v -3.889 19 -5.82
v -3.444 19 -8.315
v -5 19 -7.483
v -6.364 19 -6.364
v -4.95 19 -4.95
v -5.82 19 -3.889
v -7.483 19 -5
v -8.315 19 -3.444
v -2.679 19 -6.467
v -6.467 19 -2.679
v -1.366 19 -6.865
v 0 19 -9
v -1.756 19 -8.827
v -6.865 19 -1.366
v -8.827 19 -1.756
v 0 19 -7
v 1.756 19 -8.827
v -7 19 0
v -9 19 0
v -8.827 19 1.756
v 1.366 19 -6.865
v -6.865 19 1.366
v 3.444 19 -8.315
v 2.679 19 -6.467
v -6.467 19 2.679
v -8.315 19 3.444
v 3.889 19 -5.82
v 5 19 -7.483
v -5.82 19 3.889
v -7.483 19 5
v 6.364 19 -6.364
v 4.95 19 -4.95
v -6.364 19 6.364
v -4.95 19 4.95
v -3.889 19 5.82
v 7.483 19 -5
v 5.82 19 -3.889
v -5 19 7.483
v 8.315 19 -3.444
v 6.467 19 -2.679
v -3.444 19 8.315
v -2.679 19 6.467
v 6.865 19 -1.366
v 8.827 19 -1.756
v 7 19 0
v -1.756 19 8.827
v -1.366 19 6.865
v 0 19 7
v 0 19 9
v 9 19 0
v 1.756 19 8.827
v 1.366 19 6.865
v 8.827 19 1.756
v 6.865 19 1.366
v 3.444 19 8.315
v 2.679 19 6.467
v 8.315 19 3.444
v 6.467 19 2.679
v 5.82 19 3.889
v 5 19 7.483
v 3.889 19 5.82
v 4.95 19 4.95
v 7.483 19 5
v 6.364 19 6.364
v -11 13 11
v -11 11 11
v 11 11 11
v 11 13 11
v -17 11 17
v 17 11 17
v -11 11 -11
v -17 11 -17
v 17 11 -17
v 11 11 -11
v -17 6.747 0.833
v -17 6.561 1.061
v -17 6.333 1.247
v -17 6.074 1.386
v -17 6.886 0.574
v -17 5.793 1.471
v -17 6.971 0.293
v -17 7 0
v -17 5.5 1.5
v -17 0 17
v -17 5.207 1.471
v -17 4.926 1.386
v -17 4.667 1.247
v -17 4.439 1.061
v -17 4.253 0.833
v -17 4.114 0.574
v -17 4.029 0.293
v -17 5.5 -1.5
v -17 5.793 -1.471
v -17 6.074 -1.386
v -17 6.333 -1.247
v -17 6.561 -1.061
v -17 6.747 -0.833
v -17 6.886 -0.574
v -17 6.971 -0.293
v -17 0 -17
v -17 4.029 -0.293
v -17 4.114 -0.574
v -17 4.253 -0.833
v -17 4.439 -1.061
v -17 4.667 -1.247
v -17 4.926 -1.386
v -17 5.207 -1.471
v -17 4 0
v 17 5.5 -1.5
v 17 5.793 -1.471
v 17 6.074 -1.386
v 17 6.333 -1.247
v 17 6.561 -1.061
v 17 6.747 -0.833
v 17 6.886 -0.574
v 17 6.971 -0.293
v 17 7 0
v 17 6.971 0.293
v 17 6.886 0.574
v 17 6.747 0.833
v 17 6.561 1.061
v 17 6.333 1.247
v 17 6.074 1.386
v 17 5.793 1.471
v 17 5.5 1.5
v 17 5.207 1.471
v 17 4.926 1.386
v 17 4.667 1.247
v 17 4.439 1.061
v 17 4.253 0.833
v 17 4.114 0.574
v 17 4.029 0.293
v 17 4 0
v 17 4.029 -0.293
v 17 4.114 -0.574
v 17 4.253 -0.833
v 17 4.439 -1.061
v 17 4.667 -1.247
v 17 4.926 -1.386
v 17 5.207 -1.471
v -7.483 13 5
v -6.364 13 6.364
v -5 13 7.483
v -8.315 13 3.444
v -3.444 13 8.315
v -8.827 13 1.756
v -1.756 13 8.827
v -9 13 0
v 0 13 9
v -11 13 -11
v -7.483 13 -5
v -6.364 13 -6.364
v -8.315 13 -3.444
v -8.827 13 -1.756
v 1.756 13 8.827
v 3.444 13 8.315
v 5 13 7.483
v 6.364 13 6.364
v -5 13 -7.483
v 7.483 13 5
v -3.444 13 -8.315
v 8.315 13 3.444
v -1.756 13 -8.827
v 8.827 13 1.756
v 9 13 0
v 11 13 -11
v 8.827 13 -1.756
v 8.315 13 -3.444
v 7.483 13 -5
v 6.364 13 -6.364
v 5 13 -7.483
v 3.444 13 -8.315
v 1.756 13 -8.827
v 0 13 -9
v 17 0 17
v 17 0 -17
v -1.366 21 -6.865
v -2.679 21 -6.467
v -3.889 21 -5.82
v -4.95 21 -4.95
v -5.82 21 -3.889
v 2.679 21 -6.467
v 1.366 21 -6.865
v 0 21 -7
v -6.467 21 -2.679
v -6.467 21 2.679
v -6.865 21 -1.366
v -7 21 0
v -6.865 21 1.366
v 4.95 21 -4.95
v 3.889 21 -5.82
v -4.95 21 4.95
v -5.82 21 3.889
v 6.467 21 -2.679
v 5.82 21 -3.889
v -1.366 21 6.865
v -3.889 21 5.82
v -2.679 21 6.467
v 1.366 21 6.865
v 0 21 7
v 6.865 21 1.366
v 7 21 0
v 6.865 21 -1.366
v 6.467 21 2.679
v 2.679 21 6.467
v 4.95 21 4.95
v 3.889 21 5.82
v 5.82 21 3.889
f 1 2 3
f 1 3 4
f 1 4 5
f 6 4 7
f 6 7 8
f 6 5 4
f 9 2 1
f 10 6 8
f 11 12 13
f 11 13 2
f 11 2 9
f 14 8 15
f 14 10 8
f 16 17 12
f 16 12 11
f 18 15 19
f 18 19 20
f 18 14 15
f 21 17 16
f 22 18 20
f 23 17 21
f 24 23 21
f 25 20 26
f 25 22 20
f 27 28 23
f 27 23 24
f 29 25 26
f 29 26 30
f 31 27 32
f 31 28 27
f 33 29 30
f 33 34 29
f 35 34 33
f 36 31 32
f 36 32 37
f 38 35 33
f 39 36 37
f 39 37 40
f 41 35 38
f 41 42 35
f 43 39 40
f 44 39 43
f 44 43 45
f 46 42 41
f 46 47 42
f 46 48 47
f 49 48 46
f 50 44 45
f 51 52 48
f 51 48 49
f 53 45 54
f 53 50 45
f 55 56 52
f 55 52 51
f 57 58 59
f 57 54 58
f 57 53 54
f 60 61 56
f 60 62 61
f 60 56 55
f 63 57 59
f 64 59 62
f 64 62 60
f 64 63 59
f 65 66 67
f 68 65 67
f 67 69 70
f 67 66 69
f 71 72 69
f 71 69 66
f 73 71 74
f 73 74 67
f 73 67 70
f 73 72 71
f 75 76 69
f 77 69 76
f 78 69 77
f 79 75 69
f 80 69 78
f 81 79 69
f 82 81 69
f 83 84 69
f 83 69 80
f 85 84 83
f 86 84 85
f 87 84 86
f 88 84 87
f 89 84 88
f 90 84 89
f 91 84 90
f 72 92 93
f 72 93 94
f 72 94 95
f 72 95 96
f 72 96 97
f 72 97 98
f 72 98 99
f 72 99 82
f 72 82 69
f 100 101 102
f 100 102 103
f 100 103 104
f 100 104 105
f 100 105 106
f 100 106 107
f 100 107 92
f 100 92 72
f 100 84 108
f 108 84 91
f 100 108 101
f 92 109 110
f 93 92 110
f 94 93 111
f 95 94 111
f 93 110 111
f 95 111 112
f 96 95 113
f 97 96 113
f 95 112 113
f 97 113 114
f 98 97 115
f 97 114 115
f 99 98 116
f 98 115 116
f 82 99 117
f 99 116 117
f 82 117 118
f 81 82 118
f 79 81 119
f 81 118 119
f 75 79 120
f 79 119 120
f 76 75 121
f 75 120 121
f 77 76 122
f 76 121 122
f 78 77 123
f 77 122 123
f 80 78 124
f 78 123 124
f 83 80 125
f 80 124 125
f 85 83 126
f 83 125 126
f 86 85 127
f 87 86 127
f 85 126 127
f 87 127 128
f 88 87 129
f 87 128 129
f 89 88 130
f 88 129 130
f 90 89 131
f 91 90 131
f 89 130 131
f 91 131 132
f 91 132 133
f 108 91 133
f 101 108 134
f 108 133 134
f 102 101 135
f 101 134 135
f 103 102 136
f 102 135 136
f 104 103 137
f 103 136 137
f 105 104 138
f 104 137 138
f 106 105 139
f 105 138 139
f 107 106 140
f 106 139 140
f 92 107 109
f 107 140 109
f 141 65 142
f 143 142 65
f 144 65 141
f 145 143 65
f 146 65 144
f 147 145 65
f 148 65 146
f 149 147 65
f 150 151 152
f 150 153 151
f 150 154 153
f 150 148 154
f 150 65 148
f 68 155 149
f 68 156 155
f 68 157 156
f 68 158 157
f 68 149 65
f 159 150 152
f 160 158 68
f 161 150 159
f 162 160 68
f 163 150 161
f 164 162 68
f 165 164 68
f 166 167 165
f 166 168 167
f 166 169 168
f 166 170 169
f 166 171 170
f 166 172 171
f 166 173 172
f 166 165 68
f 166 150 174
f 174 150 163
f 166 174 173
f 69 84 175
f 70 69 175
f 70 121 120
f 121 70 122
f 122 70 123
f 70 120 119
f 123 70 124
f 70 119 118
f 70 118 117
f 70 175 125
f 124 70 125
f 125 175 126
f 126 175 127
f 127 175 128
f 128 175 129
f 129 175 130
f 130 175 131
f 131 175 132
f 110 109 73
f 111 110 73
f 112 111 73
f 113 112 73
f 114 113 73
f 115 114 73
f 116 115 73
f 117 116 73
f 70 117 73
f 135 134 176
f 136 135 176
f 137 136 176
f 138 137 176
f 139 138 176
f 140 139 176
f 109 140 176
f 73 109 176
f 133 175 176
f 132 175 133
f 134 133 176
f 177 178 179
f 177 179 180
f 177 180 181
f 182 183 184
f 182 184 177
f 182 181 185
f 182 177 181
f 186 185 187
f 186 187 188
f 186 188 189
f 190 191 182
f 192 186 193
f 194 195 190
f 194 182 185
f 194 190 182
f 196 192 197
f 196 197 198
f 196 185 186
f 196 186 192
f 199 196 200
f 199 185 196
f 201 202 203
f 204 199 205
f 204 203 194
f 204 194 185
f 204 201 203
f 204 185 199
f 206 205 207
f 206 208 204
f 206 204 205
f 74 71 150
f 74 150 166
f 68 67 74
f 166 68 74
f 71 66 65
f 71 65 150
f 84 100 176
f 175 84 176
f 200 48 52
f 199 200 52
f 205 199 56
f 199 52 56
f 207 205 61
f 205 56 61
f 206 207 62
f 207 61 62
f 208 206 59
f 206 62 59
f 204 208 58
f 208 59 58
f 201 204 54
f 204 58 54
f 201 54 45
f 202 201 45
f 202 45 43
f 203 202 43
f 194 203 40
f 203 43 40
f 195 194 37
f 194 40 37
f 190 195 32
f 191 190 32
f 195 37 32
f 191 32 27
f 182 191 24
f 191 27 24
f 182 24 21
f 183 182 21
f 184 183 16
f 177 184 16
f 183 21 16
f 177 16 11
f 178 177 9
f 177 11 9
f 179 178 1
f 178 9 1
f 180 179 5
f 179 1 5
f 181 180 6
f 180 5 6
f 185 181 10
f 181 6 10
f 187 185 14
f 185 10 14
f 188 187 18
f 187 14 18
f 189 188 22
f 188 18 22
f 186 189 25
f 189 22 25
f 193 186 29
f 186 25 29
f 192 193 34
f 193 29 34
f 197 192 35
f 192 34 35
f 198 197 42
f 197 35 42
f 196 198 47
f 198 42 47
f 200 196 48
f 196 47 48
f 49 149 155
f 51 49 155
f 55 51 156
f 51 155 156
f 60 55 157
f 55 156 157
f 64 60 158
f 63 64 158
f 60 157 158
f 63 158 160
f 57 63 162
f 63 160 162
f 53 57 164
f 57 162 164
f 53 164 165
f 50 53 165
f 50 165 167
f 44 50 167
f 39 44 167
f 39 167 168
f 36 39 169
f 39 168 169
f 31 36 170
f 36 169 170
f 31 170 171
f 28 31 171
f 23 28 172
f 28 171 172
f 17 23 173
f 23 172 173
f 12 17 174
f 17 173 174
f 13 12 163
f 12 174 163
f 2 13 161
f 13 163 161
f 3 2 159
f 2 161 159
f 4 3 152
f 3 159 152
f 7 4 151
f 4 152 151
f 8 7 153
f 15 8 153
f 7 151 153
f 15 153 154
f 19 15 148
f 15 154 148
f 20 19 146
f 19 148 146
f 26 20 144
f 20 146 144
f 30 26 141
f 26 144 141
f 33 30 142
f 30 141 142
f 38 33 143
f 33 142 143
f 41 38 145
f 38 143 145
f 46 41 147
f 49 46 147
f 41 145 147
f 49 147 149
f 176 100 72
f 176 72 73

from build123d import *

# Parameters (mm, degrees)
SKETCH_1_W          = 34
SKETCH_1_H          = 34
EXTRUDE_1_DEPTH     = 11
SKETCH_2_W          = 22
SKETCH_2_H          = 22
EXTRUDE_2_DEPTH     = 2
SKETCH_3_R          = 9
EXTRUDE_3_DEPTH     = 6
SKETCH_4_R          = 7
EXTRUDE_4_DEPTH     = 2
SKETCH_5_R          = 1.5
CUT_EXTRUDE_1_DEPTH = 34


with BuildPart() as part:
    # 草图1 → 凸台-拉伸1 (new body)
    with BuildSketch(Plane(origin=(0, 0, 0), x_dir=(1, 0, 0), z_dir=(0, 1, 0))):
        Rectangle(SKETCH_1_W, SKETCH_1_H)
    extrude(amount=EXTRUDE_1_DEPTH)

    # 草图2 → 凸台-拉伸2 (add)
    with BuildSketch(Plane(origin=(0, 11, 0), x_dir=(1, 0, 0), z_dir=(0, 1, 0))):
        Rectangle(SKETCH_2_W, SKETCH_2_H)
    extrude(amount=EXTRUDE_2_DEPTH)

    # 草图3 → 凸台-拉伸3 (add)
    with BuildSketch(Plane(origin=(0, 13, 0), x_dir=(1, 0, 0), z_dir=(0, 1, 0))):
        with Locations(Location((0, 0, 0), (0, 0, 270))):
            Circle(SKETCH_3_R)
    extrude(amount=EXTRUDE_3_DEPTH)

    # 草图4 → 凸台-拉伸4 (add)
    with BuildSketch(Plane(origin=(0, 19, 0), x_dir=(1, 0, 0), z_dir=(0, 1, 0))):
        with Locations(Location((0, 0, 0), (0, 0, 270))):
            Circle(SKETCH_4_R)
    extrude(amount=EXTRUDE_4_DEPTH)

    # 草图5 → 切除-拉伸1 (cut)
    with BuildSketch(Plane(origin=(17, 0, 0), x_dir=(0, 0, -1), z_dir=(1, 0, 0))):
        with Locations((0, 5.5)):
            Circle(SKETCH_5_R)
    extrude(amount=-CUT_EXTRUDE_1_DEPTH, mode=Mode.SUBTRACT)


solid = part.part
